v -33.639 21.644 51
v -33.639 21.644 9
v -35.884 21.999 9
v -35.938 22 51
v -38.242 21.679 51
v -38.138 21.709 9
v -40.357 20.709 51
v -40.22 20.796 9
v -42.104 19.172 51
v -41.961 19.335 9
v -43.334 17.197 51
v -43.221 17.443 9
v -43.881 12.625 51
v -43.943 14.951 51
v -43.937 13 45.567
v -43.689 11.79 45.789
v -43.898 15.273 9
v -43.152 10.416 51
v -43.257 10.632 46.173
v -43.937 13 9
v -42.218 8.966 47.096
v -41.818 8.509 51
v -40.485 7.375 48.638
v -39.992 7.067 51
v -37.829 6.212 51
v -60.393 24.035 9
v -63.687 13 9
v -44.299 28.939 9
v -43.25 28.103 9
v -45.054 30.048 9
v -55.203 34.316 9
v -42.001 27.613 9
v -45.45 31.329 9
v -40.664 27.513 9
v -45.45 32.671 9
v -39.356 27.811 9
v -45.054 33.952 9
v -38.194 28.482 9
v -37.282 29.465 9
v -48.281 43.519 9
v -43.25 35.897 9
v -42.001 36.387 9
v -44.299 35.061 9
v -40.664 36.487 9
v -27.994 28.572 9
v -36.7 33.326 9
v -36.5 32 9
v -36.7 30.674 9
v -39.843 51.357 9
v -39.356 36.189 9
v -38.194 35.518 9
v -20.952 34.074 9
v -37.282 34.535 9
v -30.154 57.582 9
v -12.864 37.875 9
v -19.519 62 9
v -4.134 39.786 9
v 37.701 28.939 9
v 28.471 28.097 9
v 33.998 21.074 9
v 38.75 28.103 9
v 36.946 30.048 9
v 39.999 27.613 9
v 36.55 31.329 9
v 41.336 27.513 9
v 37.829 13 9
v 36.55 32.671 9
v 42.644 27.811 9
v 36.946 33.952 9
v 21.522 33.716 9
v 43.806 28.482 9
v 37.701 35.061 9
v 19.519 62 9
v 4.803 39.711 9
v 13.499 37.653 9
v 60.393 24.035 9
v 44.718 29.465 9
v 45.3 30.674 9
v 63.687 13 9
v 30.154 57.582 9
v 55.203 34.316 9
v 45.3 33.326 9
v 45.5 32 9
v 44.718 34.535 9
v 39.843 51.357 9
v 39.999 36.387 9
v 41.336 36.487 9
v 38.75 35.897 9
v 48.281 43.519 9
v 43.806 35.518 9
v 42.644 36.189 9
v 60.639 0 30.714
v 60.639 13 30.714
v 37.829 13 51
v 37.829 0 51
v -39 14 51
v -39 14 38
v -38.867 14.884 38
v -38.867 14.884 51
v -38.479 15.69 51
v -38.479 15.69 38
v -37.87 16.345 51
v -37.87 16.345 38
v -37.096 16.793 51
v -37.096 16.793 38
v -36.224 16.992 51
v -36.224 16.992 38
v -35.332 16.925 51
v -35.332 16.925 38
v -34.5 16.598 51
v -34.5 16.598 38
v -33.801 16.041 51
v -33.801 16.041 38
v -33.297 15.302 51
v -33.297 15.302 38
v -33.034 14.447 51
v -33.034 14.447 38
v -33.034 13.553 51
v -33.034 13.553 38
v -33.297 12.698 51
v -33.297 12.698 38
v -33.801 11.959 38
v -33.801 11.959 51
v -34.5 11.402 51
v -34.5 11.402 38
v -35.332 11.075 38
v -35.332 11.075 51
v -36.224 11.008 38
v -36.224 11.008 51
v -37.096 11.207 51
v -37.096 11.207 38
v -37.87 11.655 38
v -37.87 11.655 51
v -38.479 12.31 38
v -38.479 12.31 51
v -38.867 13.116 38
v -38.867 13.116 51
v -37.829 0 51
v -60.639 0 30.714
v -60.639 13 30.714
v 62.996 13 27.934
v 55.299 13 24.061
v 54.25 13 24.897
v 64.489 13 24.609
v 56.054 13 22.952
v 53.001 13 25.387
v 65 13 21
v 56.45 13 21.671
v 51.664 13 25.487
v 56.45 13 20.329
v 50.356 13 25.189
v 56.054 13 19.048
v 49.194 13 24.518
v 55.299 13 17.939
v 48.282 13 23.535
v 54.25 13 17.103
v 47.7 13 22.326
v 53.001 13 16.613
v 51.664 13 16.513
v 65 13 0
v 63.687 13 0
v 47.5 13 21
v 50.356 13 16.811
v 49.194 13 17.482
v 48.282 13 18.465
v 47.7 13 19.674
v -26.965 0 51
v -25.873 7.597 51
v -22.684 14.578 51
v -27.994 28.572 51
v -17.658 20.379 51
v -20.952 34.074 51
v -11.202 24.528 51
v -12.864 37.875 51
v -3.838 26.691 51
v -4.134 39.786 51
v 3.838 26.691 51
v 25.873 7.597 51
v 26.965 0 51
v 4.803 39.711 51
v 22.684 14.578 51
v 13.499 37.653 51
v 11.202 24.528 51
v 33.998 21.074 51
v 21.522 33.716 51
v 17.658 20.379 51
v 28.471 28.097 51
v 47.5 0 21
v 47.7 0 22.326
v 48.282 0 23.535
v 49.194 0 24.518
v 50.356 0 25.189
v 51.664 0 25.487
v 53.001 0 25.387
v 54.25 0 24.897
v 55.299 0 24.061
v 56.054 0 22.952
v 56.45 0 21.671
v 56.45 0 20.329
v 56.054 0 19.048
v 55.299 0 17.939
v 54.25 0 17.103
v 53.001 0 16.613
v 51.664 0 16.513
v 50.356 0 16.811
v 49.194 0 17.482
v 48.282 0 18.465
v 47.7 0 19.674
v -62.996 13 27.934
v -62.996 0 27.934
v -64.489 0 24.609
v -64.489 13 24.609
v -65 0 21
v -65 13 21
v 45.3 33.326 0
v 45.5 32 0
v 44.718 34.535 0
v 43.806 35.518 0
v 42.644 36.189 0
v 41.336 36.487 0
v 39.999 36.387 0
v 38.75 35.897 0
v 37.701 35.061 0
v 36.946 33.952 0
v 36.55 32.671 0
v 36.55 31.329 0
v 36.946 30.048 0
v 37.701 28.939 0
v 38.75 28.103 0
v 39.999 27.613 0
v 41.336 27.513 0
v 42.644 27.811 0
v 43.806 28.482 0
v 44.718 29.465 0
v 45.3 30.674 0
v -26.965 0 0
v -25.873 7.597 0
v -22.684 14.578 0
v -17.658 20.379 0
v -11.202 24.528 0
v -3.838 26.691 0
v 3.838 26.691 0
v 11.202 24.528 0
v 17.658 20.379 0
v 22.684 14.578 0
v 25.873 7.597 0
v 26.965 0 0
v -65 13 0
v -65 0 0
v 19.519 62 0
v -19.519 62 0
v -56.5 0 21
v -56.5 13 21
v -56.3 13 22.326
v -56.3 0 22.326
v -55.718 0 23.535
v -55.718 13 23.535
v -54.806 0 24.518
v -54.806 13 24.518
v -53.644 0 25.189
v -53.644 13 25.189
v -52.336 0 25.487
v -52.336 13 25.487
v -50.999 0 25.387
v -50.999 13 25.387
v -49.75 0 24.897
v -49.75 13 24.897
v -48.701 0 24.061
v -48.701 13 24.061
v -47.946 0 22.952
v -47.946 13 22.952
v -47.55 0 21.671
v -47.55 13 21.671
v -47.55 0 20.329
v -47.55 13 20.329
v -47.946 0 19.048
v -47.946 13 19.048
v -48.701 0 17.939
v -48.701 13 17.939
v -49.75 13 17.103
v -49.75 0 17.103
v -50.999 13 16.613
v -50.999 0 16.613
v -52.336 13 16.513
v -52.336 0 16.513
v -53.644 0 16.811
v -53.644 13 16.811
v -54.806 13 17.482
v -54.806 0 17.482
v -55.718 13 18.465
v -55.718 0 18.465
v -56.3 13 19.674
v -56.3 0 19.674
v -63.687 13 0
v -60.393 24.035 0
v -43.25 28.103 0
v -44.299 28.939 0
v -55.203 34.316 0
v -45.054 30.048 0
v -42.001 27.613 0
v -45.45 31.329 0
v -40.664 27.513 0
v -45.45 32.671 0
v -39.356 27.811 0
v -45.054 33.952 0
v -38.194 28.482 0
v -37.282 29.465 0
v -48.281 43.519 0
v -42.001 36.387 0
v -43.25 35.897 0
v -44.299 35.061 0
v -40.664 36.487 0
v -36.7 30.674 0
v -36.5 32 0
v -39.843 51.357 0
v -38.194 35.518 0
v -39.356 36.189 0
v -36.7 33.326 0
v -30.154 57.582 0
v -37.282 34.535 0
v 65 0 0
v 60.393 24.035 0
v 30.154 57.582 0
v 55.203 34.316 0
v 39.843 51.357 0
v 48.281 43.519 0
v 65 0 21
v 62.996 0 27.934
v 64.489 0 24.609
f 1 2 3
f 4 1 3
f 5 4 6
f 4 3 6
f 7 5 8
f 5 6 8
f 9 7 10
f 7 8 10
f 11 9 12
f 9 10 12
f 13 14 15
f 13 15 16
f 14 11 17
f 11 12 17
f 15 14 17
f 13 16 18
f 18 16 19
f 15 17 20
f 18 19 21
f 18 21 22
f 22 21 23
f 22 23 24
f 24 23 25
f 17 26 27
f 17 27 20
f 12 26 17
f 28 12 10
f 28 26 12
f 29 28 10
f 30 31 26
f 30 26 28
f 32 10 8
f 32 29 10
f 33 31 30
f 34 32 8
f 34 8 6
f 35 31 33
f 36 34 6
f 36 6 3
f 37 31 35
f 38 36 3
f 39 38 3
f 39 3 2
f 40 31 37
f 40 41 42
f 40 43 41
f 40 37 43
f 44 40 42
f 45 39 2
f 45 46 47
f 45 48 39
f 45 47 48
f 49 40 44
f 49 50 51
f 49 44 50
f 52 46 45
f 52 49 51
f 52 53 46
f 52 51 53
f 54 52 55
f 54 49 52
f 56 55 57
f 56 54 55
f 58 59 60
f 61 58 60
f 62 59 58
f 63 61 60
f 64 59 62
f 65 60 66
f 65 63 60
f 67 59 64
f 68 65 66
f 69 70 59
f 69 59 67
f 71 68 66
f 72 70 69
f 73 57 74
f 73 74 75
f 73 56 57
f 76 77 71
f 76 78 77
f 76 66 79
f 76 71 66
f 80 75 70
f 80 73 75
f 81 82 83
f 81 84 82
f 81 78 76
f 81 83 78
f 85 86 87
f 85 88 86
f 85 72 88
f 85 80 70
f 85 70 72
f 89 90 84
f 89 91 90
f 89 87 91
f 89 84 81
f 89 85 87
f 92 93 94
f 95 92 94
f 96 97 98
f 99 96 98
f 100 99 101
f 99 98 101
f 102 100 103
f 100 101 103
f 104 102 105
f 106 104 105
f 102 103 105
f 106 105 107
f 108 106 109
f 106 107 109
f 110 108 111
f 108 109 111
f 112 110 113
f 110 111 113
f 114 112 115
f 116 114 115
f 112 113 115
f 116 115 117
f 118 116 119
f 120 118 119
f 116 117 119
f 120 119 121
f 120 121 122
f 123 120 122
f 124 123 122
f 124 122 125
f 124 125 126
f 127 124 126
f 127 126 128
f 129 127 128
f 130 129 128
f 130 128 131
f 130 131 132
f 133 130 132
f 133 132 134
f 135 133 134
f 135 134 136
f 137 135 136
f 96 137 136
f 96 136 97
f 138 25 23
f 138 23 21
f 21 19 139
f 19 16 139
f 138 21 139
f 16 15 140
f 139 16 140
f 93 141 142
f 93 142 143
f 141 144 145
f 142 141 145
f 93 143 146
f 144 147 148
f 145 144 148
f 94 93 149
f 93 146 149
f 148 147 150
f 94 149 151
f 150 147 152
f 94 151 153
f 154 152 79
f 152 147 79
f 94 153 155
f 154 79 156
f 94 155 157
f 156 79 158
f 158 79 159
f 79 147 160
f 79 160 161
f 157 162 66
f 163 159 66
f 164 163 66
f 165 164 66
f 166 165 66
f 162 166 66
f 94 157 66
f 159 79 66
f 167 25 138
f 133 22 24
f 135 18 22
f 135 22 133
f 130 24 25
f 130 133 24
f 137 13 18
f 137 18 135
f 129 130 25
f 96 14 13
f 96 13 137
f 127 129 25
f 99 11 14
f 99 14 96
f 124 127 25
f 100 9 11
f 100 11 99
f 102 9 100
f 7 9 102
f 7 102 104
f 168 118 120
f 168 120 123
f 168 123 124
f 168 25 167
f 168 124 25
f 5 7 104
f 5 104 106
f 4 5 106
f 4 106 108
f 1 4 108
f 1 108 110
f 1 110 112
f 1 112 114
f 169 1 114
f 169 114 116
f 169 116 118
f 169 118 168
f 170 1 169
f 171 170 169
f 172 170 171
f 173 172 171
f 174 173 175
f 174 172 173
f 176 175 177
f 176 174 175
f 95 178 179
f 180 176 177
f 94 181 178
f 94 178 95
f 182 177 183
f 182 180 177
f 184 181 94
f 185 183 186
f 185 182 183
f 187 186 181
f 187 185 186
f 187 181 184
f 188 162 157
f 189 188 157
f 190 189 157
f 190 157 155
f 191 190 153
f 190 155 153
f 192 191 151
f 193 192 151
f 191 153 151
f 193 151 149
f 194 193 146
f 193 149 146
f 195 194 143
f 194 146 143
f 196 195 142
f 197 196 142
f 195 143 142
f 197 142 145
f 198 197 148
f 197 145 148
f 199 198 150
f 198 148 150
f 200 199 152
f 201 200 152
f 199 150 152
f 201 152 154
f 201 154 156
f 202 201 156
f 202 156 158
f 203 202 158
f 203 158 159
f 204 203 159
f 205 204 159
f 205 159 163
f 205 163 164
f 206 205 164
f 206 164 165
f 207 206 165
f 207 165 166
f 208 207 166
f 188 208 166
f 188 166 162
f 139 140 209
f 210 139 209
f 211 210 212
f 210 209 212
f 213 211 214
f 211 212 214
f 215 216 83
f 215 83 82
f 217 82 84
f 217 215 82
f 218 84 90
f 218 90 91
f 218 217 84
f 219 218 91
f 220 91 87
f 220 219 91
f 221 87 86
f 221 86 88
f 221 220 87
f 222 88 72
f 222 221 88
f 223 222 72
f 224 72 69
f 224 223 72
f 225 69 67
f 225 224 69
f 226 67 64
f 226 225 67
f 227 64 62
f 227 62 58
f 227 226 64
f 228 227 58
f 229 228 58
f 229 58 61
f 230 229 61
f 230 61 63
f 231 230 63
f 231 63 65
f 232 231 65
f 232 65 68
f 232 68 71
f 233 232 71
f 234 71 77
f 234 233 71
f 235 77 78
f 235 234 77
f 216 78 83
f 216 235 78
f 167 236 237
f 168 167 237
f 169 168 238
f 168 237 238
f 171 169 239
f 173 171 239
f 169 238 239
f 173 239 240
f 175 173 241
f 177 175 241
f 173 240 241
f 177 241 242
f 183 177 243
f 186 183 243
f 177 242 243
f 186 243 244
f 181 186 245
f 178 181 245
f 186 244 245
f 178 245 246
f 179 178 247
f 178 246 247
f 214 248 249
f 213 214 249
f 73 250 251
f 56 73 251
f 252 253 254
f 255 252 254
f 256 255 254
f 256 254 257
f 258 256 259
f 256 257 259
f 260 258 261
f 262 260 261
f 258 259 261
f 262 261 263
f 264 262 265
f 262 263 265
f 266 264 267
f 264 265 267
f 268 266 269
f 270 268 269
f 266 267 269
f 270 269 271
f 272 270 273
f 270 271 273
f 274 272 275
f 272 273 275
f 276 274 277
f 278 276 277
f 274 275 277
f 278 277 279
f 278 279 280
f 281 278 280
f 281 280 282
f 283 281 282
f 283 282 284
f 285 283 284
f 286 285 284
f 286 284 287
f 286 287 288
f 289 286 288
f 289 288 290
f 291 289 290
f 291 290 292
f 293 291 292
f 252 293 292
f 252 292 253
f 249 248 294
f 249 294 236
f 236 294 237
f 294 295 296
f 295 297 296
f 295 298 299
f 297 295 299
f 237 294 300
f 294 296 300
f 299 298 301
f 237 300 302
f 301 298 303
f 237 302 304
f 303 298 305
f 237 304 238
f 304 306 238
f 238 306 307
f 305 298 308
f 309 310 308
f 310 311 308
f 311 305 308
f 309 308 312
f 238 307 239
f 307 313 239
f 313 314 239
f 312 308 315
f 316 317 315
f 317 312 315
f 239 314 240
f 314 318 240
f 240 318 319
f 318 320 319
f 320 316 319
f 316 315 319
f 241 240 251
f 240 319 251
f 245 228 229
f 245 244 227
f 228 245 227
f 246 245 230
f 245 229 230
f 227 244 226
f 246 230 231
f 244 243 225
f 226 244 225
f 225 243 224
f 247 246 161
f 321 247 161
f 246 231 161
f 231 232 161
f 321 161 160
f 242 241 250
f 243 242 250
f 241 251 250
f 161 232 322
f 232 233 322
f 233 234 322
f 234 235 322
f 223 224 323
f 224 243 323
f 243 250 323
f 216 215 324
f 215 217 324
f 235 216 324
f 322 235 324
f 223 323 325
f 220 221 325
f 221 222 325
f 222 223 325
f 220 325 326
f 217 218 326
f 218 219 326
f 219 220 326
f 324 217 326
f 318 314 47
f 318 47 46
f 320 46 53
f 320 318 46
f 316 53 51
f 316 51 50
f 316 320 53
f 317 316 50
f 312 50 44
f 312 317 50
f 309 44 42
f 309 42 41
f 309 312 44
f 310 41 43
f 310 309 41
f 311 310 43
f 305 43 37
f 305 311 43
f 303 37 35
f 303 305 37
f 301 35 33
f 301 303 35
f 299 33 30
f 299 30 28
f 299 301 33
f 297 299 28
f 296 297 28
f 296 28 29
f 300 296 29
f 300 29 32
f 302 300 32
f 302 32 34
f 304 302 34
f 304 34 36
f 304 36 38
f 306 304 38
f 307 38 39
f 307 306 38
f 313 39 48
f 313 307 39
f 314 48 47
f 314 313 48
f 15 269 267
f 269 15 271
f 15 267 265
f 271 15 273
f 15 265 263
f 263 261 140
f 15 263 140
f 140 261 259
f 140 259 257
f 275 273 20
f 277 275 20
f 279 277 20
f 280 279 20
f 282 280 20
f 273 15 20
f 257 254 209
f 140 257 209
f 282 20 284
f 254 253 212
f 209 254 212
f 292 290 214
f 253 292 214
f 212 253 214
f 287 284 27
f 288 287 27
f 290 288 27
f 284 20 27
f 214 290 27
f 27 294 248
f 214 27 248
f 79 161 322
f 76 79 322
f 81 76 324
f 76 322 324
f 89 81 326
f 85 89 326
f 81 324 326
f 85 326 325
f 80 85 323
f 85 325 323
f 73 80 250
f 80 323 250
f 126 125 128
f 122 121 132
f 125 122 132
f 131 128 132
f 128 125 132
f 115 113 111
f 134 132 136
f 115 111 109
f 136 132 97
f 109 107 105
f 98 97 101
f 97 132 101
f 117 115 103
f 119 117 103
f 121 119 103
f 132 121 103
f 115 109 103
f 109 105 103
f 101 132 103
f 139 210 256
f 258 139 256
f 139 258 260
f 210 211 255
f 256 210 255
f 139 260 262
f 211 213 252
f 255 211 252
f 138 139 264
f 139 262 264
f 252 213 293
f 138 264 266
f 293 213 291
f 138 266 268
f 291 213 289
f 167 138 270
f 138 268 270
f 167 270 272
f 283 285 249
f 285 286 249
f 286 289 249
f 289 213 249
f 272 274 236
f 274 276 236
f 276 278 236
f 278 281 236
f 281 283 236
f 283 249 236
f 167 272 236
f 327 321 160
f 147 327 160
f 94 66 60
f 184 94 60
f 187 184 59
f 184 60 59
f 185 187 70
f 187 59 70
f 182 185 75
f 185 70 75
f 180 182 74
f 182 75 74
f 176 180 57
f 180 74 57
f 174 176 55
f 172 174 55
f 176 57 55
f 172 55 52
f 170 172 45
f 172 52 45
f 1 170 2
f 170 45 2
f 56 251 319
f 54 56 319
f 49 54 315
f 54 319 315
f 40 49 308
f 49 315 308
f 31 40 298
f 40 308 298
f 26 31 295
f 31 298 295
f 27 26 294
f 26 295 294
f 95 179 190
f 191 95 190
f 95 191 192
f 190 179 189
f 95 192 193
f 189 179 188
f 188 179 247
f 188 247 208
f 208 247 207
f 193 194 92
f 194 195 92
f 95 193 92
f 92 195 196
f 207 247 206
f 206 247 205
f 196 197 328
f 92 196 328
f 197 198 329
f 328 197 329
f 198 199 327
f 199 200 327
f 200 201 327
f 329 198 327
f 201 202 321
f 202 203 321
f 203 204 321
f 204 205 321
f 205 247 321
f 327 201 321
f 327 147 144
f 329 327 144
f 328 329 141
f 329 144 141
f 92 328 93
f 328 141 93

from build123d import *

# Parameters (mm, degrees)
BOSS_EXTRUDE1_DEPTH       = 51
BOSS_EXTRUDE2_DEPTH       = 51
SKETCH1_4_R               = 4.5
BOSS_EXTRUDE3_DEPTH       = 9
CUT_EXTRUDE1_REACH        = 98.057
SKETCH2_R                 = 4.5
BOSS_EXTRUDE4_START       = -42
SKETCH3_R                 = 8
BOSS_EXTRUDE4_DEPTH       = 42
F_6_0MM_DOWEL_HOLE1_D     = 6
F_6_0MM_DOWEL_HOLE1_DEPTH = 13


with BuildPart() as part:
    # Sketch1 → Boss-Extrude1 (new body)
    with BuildSketch(Plane.XY):
        with BuildLine():
            ThreePointArc((40, 0), (39.453405592, 6.590052141), (37.828560639, 13))
            ThreePointArc((37.828560639, 13), (0, 40), (-37.828560639, 13))
            ThreePointArc((-37.828560639, 13), (-39.453405592, 6.590052141), (-40, 0))
            Line((-40, 0), (-26.965, 0))
            ThreePointArc((-26.965, 0), (0, 26.965), (26.965, 0))
            Line((26.965, 0), (40, 0))
        make_face()
    extrude(amount=BOSS_EXTRUDE1_DEPTH)

    # Sketch1<3> → Boss-Extrude2 (add)
    with BuildSketch(Plane.XY):
        with BuildLine():
            Line((63.686733312, 13), (37.828560639, 13))
            ThreePointArc((37.828560639, 13), (39.453405592, 6.590052141), (40, 0))
            Line((40, 0), (65, 0))
            Line((65, 0), (65, 13))
            Line((65, 13), (63.686733312, 13))
        make_face()
        with BuildLine():
            ThreePointArc((-40, 0), (-39.453405592, 6.590052141), (-37.828560639, 13))
            Line((-37.828560639, 13), (-63.686733312, 13))
            Line((-63.686733312, 13), (-65, 13))
            Line((-65, 13), (-65, 0))
            Line((-65, 0), (-40, 0))
        make_face()
    extrude(amount=BOSS_EXTRUDE2_DEPTH)

    # Sketch1<4> → Boss-Extrude3 (add)
    with BuildSketch(Plane.XY):
        with BuildLine():
            ThreePointArc((-37.828560639, 13), (0, 40), (37.828560639, 13))
            Line((37.828560639, 13), (63.686733312, 13))
            ThreePointArc((63.686733312, 13), (48.281028578, 43.519447141), (19.519221296, 62))
            Line((19.519221296, 62), (-19.519221296, 62))
            ThreePointArc((-19.519221296, 62), (-48.281028578, 43.519447141), (-63.686733312, 13))
            Line((-63.686733312, 13), (-37.828560639, 13))
        make_face()
        with Locations((-41, 32)):
            Circle(SKETCH1_4_R, mode=Mode.SUBTRACT)
        with Locations((41, 32)):
            Circle(SKETCH1_4_R, mode=Mode.SUBTRACT)
    extrude(amount=BOSS_EXTRUDE3_DEPTH)

    # Sketch2 → Cut-Extrude1 (cut, up to next)
    with BuildSketch(Plane(origin=(0, 13, 0), x_dir=(1, 0, 0), z_dir=(0, 1, 0)), mode=Mode.PRIVATE) as cut_extrude1_sk1:
        with Locations(Location((52, -21, 0), (0, 0, 180))):
            Circle(SKETCH2_R)
    cut_extrude1_tool1 = extrude(cut_extrude1_sk1.sketch, amount=-CUT_EXTRUDE1_REACH, mode=Mode.PRIVATE) & part.part
    # Sketch2 → Cut-Extrude1 (cut, up to next)
    with BuildSketch(Plane(origin=(0, 13, 0), x_dir=(1, 0, 0), z_dir=(0, 1, 0)), mode=Mode.PRIVATE) as cut_extrude1_sk2:
        with Locations(Location((-52, -21, 0), (0, 0, 180))):
            Circle(SKETCH2_R)
    cut_extrude1_tool2 = extrude(cut_extrude1_sk2.sketch, amount=-CUT_EXTRUDE1_REACH, mode=Mode.PRIVATE) & part.part
    # Sketch2 → Cut-Extrude1 (cut, up to next)
    with BuildSketch(Plane(origin=(0, 13, 0), x_dir=(1, 0, 0), z_dir=(0, 1, 0)), mode=Mode.PRIVATE) as cut_extrude1_sk3:
        with BuildLine():
            Line((65, -51), (65, -21))
            ThreePointArc((65, -21), (63.859756378, -26.324112946), (60.639049437, -30.714258841))
            Line((60.639049437, -30.714258841), (37.828560639, -51))
            Line((37.828560639, -51), (65, -51))
        make_face()
    cut_extrude1_tool3 = extrude(cut_extrude1_sk3.sketch, amount=-CUT_EXTRUDE1_REACH, mode=Mode.PRIVATE) & part.part
    # Sketch2 → Cut-Extrude1 (cut, up to next)
    with BuildSketch(Plane(origin=(0, 13, 0), x_dir=(1, 0, 0), z_dir=(0, 1, 0)), mode=Mode.PRIVATE) as cut_extrude1_sk4:
        with BuildLine():
            Line((-65, -51), (-37.828560639, -51))
            Line((-37.828560639, -51), (-60.639049437, -30.714258841))
            ThreePointArc((-60.639049437, -30.714258841), (-63.859756378, -26.324112946), (-65, -21))
            Line((-65, -21), (-65, -51))
        make_face()
    cut_extrude1_tool4 = extrude(cut_extrude1_sk4.sketch, amount=-CUT_EXTRUDE1_REACH, mode=Mode.PRIVATE) & part.part
    add(cut_extrude1_tool1.solids().sort_by_distance((52, 13, 21))[0], mode=Mode.SUBTRACT)
    add(cut_extrude1_tool2.solids().sort_by_distance((-52, 13, 21))[0], mode=Mode.SUBTRACT)
    add(cut_extrude1_tool3.solids().sort_by_distance((56.054542, 13, 42.719243))[0], mode=Mode.SUBTRACT)
    add(cut_extrude1_tool4.solids().sort_by_distance((-56.054542, 13, 42.719243))[0], mode=Mode.SUBTRACT)

    # Sketch3 → Boss-Extrude4 (add)
    with BuildSketch(Plane.XY.offset(51).offset(BOSS_EXTRUDE4_START)):
        with Locations((-36, 14)):
            Circle(SKETCH3_R)
    extrude(amount=BOSS_EXTRUDE4_DEPTH)

    # Ø6.0mm Dowel Hole1
    with Locations(Plane.XY.offset(51)):
        with Locations((-36, 14)):
            Hole(F_6_0MM_DOWEL_HOLE1_D / 2, depth=F_6_0MM_DOWEL_HOLE1_DEPTH)


solid = part.part
